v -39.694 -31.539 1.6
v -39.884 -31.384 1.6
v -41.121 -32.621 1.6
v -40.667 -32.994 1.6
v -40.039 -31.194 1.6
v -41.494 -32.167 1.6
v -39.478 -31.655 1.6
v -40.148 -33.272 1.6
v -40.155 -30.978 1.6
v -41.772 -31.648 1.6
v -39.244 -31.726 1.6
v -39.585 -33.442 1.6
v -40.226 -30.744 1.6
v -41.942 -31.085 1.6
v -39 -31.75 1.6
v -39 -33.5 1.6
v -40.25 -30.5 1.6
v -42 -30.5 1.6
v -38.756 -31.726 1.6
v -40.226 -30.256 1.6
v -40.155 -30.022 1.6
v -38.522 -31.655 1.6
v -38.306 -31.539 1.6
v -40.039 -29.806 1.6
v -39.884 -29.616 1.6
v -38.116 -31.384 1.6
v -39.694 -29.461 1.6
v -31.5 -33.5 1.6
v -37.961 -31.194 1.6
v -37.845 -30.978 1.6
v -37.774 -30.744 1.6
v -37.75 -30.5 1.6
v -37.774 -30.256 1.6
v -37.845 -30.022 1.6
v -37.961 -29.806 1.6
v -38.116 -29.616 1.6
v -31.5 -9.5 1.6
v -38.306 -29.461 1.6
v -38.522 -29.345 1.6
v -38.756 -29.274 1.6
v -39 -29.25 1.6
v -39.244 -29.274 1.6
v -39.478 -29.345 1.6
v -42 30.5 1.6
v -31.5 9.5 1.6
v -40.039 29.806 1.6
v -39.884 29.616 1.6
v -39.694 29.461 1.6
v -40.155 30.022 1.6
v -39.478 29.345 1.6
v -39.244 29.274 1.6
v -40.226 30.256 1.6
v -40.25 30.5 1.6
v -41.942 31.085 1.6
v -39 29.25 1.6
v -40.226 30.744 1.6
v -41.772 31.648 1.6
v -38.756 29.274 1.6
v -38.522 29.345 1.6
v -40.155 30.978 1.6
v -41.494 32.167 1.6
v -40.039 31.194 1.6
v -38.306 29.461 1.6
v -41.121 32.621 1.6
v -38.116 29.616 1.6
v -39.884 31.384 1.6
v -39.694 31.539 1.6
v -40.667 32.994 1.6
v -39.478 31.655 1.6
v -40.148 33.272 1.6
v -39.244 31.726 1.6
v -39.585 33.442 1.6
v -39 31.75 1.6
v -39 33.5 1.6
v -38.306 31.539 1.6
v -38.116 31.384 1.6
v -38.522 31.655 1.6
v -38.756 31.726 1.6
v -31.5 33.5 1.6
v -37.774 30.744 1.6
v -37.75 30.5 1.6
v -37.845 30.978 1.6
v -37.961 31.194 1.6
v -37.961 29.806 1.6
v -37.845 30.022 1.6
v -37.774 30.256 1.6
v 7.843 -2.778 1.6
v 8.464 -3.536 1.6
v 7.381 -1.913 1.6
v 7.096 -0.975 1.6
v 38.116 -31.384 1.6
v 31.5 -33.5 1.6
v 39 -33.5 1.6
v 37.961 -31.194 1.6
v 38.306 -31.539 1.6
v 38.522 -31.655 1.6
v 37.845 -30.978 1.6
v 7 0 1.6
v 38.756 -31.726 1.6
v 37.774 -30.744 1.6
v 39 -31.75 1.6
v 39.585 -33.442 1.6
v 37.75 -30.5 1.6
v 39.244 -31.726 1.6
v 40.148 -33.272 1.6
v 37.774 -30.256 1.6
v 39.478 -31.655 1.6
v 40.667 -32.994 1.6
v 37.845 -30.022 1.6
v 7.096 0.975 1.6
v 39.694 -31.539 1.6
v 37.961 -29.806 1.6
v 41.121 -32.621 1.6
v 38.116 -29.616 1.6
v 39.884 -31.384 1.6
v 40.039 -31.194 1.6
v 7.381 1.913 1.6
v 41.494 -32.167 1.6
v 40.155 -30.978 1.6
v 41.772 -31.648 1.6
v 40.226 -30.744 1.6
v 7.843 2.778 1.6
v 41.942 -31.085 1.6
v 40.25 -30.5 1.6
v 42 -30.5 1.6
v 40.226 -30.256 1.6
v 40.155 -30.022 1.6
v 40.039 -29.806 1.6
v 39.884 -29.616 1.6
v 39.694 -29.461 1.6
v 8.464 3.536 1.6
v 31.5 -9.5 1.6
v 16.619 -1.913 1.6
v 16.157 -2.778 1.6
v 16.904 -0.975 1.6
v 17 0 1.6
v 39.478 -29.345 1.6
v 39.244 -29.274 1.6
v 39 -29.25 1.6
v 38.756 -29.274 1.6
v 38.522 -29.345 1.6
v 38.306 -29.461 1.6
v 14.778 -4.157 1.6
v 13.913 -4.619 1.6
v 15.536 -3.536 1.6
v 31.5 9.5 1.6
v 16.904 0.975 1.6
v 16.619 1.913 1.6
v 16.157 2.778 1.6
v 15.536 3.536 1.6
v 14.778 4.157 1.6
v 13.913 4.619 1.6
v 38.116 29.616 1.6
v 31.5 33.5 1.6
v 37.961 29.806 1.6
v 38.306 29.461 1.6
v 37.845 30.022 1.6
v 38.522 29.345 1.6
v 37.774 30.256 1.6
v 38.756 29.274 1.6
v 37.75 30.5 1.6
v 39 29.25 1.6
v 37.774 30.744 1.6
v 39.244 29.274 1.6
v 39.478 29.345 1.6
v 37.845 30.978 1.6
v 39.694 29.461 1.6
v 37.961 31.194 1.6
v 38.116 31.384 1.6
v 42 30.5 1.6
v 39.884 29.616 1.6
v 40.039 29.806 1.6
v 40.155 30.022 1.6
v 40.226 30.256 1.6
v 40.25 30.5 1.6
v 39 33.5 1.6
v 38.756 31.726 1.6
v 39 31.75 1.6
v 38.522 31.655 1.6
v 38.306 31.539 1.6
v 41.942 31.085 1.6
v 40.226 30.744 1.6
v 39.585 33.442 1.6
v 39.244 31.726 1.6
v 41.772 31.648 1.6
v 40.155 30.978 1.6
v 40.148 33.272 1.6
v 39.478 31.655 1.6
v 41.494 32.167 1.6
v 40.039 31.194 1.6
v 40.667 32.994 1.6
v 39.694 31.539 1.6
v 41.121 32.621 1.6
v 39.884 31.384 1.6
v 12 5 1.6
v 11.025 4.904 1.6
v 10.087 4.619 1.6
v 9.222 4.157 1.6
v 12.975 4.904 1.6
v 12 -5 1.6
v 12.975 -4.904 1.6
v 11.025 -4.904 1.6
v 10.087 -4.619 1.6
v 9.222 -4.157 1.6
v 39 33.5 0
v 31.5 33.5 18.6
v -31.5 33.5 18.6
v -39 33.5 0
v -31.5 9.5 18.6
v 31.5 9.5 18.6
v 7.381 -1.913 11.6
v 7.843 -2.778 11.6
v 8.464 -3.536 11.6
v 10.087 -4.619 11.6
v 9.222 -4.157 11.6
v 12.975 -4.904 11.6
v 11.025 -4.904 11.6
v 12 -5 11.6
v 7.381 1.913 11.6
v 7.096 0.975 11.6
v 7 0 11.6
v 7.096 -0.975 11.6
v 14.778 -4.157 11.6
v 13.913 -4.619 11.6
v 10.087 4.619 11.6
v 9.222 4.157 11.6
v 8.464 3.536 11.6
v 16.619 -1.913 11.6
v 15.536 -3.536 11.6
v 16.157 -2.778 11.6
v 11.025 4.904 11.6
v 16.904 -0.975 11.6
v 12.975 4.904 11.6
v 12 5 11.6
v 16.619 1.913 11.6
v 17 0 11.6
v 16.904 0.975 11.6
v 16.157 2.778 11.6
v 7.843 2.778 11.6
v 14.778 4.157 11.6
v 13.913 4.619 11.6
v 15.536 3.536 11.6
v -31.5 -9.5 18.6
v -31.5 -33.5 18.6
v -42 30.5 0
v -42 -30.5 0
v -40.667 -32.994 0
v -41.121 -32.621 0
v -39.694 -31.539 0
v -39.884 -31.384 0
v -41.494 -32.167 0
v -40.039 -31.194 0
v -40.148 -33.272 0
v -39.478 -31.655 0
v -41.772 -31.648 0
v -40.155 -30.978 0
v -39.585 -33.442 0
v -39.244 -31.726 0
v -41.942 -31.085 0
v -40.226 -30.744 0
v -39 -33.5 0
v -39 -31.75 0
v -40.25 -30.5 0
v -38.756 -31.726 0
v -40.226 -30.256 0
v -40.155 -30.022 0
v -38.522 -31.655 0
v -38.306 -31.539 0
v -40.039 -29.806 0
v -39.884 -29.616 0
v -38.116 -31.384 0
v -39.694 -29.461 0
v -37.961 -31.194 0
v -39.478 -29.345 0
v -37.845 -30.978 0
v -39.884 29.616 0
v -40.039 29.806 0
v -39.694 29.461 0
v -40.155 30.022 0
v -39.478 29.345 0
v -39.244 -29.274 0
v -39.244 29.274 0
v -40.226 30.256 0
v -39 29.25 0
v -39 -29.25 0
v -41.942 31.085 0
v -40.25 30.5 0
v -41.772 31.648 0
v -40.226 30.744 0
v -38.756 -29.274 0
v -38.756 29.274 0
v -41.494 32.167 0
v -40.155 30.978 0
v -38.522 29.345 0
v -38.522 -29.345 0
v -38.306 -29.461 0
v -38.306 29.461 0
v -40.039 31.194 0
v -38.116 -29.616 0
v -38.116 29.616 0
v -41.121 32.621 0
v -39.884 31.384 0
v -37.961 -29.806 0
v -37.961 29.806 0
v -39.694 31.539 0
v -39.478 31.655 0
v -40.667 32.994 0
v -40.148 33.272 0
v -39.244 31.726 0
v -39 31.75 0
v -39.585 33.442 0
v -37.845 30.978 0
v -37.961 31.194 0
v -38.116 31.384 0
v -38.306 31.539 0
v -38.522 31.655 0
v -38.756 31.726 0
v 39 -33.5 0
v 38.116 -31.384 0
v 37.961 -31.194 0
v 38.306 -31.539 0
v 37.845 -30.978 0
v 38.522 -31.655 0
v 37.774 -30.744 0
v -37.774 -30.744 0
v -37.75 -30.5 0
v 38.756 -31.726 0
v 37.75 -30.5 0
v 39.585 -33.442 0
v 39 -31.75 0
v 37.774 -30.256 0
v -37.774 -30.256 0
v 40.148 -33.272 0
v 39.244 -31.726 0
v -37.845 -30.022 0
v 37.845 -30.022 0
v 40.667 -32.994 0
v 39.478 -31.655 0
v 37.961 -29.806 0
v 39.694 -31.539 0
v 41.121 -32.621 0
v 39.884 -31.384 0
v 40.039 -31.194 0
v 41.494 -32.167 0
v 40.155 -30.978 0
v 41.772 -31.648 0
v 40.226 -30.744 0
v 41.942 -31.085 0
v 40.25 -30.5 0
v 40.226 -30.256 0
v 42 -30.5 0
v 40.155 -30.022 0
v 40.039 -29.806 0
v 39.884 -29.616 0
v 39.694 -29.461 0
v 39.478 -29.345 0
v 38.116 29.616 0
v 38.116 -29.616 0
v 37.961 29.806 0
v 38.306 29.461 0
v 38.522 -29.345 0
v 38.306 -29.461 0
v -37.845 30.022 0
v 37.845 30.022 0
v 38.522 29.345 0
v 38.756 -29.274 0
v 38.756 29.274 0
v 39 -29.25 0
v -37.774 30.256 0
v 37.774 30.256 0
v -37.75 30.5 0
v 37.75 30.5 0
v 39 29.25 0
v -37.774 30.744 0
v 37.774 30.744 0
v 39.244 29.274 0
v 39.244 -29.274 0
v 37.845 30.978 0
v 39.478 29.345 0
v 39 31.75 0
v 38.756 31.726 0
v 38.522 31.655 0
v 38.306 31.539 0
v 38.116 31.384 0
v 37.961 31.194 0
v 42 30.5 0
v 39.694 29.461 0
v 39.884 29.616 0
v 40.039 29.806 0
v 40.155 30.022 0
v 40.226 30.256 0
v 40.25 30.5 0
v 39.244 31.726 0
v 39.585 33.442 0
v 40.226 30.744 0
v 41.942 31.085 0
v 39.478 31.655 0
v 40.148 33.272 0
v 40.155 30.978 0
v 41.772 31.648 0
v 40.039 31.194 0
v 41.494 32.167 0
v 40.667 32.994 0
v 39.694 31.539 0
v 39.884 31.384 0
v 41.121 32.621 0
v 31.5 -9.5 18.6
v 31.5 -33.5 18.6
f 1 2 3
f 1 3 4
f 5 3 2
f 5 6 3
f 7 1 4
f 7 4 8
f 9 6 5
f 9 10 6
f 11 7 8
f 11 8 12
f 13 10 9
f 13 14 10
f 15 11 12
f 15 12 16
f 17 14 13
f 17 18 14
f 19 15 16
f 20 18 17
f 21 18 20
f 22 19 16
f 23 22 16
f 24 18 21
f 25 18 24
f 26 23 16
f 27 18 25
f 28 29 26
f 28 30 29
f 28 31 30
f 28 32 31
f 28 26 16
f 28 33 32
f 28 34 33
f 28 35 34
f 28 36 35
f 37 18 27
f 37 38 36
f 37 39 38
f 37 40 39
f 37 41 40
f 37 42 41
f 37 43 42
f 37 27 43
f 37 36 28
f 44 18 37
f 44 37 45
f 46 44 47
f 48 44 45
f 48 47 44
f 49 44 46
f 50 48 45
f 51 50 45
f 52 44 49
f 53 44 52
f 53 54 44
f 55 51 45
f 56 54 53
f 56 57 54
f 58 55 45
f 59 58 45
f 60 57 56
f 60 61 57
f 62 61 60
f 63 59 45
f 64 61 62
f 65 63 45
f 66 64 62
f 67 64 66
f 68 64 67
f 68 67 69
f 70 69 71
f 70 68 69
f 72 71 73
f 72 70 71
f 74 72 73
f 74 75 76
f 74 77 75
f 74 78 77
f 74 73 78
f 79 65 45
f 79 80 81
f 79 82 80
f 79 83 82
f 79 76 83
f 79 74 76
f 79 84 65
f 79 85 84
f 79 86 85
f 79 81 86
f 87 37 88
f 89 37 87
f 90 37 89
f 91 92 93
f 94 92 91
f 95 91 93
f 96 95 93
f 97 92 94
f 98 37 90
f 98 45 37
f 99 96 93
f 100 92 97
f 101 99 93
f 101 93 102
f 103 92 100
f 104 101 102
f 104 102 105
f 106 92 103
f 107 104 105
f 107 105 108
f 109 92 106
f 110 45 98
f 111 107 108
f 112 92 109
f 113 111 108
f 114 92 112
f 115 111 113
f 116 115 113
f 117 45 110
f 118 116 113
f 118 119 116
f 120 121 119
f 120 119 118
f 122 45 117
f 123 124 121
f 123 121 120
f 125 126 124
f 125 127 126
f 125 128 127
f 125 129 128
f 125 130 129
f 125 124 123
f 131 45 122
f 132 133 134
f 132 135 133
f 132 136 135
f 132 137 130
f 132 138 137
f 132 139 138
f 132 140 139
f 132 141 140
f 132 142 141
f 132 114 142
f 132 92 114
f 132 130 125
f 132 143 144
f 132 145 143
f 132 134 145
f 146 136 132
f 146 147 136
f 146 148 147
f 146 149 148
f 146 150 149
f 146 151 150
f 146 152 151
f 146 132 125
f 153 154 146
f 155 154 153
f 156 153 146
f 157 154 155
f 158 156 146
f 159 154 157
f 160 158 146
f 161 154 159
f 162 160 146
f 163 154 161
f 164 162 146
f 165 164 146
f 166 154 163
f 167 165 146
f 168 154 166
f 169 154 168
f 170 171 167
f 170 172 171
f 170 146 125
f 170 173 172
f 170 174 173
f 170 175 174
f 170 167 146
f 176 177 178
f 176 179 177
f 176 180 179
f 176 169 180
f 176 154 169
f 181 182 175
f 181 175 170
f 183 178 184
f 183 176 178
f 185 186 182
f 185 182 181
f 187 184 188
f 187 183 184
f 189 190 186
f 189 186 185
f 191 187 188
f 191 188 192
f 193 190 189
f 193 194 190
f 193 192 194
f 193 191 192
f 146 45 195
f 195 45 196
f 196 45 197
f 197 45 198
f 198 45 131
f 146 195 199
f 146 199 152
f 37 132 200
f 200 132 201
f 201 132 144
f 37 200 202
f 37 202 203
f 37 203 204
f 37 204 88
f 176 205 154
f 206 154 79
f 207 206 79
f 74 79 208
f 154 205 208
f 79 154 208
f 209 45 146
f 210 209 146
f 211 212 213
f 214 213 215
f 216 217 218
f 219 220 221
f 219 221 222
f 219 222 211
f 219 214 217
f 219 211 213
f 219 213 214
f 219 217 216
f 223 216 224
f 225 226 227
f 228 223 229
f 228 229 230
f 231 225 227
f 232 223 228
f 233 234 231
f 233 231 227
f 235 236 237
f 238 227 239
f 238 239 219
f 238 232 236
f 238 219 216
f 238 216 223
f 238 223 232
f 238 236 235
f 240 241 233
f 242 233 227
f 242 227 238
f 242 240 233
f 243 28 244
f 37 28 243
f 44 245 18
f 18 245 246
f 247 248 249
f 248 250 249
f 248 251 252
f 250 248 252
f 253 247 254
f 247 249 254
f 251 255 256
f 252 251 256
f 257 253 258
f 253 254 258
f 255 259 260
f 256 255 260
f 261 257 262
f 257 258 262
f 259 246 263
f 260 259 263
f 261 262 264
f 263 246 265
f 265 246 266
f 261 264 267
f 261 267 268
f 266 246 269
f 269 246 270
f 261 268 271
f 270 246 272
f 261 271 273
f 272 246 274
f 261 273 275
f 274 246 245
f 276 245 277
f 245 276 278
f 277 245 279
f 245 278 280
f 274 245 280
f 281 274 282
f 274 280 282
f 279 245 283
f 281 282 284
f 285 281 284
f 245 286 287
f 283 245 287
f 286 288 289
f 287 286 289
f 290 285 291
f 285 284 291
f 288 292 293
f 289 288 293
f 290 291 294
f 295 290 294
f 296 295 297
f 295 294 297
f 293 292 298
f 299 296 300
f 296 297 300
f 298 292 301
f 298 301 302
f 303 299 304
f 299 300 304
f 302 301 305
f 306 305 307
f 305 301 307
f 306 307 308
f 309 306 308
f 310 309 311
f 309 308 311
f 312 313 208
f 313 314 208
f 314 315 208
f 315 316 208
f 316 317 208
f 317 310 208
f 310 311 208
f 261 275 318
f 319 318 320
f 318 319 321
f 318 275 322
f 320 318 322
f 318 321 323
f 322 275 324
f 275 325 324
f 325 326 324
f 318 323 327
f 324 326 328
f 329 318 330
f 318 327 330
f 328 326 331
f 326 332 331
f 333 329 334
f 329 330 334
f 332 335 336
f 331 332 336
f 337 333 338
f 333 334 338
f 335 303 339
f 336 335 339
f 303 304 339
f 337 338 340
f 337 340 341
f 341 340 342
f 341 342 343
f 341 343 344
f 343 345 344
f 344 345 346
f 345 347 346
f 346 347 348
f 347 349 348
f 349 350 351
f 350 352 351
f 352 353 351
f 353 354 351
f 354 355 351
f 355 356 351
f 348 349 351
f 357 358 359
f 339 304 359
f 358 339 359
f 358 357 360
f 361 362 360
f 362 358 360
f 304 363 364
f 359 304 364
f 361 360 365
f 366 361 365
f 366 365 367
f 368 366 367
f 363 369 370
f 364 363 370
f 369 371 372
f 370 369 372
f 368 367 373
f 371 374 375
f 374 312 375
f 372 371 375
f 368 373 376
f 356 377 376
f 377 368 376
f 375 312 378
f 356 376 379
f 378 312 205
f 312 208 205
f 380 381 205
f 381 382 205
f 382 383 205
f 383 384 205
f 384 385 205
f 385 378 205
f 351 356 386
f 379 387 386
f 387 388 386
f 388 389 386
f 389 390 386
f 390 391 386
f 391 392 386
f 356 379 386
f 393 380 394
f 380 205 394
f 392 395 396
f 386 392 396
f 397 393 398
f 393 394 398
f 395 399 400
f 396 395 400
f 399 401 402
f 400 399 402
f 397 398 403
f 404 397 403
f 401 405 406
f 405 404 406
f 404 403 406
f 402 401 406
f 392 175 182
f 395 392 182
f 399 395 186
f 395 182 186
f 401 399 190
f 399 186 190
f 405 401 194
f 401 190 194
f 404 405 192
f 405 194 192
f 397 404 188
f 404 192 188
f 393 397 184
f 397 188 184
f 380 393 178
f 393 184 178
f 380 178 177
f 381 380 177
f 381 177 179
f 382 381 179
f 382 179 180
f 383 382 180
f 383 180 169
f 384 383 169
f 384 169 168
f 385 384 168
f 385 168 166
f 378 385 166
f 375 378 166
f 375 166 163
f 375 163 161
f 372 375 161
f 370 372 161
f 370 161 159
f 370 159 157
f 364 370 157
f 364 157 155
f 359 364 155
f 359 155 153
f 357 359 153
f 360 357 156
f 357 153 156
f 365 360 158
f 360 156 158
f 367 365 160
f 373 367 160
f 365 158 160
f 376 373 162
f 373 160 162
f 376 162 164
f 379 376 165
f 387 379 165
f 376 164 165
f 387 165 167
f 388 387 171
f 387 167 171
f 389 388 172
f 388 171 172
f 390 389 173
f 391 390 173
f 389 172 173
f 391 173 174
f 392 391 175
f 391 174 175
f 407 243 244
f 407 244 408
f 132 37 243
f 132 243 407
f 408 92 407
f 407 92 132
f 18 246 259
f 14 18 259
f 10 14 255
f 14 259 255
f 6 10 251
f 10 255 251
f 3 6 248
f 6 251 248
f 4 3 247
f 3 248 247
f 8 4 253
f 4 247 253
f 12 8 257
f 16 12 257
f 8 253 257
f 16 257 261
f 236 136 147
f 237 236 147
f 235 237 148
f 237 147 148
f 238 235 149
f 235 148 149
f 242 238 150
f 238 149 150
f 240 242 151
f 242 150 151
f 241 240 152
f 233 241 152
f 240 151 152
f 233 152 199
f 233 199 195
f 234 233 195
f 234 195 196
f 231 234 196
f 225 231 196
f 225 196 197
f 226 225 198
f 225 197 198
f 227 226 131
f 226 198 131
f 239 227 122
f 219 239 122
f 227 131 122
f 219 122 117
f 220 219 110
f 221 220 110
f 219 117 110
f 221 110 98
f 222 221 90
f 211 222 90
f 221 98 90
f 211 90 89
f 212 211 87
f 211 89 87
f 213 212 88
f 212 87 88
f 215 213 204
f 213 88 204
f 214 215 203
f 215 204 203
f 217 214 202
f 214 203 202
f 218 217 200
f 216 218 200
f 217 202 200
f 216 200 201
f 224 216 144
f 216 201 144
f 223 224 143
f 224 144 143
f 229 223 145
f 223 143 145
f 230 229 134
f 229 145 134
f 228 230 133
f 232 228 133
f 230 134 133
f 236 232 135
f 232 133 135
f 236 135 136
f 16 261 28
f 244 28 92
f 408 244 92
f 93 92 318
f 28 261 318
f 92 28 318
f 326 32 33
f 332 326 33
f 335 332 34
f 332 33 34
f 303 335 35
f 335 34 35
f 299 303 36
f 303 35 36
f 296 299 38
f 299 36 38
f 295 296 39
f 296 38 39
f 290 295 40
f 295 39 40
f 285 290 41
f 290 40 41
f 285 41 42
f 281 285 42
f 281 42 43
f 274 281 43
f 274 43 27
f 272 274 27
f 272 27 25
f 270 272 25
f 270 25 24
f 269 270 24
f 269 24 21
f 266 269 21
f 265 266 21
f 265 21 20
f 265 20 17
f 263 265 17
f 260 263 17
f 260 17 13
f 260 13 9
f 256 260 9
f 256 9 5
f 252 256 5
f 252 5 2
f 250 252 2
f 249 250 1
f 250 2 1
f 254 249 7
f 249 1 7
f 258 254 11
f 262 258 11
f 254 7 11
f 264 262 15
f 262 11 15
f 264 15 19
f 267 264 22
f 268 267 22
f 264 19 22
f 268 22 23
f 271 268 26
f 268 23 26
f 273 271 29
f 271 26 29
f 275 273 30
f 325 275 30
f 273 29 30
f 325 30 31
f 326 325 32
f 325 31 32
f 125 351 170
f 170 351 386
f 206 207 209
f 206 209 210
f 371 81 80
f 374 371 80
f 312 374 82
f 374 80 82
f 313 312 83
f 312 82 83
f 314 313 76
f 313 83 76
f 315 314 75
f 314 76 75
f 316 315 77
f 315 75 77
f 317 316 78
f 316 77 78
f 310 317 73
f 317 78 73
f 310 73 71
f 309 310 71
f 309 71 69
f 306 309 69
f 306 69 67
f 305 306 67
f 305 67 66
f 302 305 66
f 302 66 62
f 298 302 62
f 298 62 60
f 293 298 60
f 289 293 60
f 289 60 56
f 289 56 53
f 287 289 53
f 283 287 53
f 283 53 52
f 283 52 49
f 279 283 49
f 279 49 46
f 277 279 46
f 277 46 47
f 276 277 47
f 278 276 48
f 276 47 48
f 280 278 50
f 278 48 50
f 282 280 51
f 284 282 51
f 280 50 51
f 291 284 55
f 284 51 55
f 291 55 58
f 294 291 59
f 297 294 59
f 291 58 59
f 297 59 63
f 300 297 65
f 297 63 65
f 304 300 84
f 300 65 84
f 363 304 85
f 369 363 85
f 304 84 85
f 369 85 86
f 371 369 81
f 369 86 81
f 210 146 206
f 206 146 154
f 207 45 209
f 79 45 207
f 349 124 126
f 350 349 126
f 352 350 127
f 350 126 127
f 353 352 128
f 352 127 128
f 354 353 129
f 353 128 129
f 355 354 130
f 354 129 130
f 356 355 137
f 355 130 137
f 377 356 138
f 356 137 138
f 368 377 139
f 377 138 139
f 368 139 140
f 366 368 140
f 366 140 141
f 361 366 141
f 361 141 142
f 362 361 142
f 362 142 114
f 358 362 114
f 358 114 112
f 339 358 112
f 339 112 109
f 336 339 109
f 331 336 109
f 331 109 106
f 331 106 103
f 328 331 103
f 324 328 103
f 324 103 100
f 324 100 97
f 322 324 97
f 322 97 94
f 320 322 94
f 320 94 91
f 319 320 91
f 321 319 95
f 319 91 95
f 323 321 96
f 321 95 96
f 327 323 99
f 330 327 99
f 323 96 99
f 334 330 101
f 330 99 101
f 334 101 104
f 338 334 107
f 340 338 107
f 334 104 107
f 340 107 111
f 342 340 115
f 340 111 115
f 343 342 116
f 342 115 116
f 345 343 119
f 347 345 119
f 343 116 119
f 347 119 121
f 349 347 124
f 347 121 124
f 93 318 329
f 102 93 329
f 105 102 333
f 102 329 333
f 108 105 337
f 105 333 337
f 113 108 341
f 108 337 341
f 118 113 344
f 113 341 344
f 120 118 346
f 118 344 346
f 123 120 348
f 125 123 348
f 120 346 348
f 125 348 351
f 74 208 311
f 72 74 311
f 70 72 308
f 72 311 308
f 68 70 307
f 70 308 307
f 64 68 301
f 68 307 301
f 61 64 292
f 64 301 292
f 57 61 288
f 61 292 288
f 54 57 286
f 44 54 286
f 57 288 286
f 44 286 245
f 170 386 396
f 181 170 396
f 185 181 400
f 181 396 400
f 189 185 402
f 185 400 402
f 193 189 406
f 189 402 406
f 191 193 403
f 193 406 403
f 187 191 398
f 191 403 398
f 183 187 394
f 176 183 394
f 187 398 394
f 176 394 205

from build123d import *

# Parameters (mm, degrees)
PAD009_DEPTH    = 1.6
SKETCH027_R     = 1.25
POCKET010_DEPTH = 1.601
SKETCH028_R     = 5
PAD010_DEPTH    = 10
SKETCH029_W     = 63
SKETCH029_H     = 24
PAD011_DEPTH    = 17


with BuildPart() as part:
    # Sketch026 → Pad009 (new body)
    with BuildSketch(Plane.XY):
        with BuildLine():
            Line((39, 33.5), (-39, 33.5))
            ThreePointArc((-39, 33.5), (-41.12132, 32.62132), (-42, 30.5))
            Line((-42, 30.5), (-42, -30.5))
            ThreePointArc((-42, -30.5), (-41.12132, -32.62132), (-39, -33.5))
            Line((-39, -33.5), (39, -33.5))
            ThreePointArc((39, -33.5), (41.12132, -32.62132), (42, -30.5))
            Line((42, -30.5), (42, 30.5))
            ThreePointArc((42, 30.5), (41.12132, 32.62132), (39, 33.5))
        make_face()
    extrude(amount=PAD009_DEPTH)

    # Sketch027 (on Face10 of Pad009) → Pocket010 (cut, through all)
    with BuildSketch(Plane.XY.offset(1.6)):
        with Locations((-39, 30.5)):
            Circle(SKETCH027_R)
        with Locations((39, 30.5)):
            Circle(SKETCH027_R)
        with Locations((39, -30.5)):
            Circle(SKETCH027_R)
        with Locations((-39, -30.5)):
            Circle(SKETCH027_R)
    extrude(amount=-POCKET010_DEPTH, mode=Mode.SUBTRACT)

    # Sketch028 (on Face5 of Pocket010) → Pad010 (join)
    with BuildSketch(Plane.XY.offset(1.6)):
        with Locations((12, 0)):
            Circle(SKETCH028_R)
    extrude(amount=PAD010_DEPTH)

    # Sketch029 (on Face5 of Pad010) → Pad011 (join)
    with BuildSketch(Plane.XY.offset(1.6)):
        with Locations((0, 21.5)):
            Rectangle(SKETCH029_W, SKETCH029_H)
        with Locations((0, -21.5)):
            Rectangle(SKETCH029_W, SKETCH029_H)
    extrude(amount=PAD011_DEPTH)


solid = part.part
